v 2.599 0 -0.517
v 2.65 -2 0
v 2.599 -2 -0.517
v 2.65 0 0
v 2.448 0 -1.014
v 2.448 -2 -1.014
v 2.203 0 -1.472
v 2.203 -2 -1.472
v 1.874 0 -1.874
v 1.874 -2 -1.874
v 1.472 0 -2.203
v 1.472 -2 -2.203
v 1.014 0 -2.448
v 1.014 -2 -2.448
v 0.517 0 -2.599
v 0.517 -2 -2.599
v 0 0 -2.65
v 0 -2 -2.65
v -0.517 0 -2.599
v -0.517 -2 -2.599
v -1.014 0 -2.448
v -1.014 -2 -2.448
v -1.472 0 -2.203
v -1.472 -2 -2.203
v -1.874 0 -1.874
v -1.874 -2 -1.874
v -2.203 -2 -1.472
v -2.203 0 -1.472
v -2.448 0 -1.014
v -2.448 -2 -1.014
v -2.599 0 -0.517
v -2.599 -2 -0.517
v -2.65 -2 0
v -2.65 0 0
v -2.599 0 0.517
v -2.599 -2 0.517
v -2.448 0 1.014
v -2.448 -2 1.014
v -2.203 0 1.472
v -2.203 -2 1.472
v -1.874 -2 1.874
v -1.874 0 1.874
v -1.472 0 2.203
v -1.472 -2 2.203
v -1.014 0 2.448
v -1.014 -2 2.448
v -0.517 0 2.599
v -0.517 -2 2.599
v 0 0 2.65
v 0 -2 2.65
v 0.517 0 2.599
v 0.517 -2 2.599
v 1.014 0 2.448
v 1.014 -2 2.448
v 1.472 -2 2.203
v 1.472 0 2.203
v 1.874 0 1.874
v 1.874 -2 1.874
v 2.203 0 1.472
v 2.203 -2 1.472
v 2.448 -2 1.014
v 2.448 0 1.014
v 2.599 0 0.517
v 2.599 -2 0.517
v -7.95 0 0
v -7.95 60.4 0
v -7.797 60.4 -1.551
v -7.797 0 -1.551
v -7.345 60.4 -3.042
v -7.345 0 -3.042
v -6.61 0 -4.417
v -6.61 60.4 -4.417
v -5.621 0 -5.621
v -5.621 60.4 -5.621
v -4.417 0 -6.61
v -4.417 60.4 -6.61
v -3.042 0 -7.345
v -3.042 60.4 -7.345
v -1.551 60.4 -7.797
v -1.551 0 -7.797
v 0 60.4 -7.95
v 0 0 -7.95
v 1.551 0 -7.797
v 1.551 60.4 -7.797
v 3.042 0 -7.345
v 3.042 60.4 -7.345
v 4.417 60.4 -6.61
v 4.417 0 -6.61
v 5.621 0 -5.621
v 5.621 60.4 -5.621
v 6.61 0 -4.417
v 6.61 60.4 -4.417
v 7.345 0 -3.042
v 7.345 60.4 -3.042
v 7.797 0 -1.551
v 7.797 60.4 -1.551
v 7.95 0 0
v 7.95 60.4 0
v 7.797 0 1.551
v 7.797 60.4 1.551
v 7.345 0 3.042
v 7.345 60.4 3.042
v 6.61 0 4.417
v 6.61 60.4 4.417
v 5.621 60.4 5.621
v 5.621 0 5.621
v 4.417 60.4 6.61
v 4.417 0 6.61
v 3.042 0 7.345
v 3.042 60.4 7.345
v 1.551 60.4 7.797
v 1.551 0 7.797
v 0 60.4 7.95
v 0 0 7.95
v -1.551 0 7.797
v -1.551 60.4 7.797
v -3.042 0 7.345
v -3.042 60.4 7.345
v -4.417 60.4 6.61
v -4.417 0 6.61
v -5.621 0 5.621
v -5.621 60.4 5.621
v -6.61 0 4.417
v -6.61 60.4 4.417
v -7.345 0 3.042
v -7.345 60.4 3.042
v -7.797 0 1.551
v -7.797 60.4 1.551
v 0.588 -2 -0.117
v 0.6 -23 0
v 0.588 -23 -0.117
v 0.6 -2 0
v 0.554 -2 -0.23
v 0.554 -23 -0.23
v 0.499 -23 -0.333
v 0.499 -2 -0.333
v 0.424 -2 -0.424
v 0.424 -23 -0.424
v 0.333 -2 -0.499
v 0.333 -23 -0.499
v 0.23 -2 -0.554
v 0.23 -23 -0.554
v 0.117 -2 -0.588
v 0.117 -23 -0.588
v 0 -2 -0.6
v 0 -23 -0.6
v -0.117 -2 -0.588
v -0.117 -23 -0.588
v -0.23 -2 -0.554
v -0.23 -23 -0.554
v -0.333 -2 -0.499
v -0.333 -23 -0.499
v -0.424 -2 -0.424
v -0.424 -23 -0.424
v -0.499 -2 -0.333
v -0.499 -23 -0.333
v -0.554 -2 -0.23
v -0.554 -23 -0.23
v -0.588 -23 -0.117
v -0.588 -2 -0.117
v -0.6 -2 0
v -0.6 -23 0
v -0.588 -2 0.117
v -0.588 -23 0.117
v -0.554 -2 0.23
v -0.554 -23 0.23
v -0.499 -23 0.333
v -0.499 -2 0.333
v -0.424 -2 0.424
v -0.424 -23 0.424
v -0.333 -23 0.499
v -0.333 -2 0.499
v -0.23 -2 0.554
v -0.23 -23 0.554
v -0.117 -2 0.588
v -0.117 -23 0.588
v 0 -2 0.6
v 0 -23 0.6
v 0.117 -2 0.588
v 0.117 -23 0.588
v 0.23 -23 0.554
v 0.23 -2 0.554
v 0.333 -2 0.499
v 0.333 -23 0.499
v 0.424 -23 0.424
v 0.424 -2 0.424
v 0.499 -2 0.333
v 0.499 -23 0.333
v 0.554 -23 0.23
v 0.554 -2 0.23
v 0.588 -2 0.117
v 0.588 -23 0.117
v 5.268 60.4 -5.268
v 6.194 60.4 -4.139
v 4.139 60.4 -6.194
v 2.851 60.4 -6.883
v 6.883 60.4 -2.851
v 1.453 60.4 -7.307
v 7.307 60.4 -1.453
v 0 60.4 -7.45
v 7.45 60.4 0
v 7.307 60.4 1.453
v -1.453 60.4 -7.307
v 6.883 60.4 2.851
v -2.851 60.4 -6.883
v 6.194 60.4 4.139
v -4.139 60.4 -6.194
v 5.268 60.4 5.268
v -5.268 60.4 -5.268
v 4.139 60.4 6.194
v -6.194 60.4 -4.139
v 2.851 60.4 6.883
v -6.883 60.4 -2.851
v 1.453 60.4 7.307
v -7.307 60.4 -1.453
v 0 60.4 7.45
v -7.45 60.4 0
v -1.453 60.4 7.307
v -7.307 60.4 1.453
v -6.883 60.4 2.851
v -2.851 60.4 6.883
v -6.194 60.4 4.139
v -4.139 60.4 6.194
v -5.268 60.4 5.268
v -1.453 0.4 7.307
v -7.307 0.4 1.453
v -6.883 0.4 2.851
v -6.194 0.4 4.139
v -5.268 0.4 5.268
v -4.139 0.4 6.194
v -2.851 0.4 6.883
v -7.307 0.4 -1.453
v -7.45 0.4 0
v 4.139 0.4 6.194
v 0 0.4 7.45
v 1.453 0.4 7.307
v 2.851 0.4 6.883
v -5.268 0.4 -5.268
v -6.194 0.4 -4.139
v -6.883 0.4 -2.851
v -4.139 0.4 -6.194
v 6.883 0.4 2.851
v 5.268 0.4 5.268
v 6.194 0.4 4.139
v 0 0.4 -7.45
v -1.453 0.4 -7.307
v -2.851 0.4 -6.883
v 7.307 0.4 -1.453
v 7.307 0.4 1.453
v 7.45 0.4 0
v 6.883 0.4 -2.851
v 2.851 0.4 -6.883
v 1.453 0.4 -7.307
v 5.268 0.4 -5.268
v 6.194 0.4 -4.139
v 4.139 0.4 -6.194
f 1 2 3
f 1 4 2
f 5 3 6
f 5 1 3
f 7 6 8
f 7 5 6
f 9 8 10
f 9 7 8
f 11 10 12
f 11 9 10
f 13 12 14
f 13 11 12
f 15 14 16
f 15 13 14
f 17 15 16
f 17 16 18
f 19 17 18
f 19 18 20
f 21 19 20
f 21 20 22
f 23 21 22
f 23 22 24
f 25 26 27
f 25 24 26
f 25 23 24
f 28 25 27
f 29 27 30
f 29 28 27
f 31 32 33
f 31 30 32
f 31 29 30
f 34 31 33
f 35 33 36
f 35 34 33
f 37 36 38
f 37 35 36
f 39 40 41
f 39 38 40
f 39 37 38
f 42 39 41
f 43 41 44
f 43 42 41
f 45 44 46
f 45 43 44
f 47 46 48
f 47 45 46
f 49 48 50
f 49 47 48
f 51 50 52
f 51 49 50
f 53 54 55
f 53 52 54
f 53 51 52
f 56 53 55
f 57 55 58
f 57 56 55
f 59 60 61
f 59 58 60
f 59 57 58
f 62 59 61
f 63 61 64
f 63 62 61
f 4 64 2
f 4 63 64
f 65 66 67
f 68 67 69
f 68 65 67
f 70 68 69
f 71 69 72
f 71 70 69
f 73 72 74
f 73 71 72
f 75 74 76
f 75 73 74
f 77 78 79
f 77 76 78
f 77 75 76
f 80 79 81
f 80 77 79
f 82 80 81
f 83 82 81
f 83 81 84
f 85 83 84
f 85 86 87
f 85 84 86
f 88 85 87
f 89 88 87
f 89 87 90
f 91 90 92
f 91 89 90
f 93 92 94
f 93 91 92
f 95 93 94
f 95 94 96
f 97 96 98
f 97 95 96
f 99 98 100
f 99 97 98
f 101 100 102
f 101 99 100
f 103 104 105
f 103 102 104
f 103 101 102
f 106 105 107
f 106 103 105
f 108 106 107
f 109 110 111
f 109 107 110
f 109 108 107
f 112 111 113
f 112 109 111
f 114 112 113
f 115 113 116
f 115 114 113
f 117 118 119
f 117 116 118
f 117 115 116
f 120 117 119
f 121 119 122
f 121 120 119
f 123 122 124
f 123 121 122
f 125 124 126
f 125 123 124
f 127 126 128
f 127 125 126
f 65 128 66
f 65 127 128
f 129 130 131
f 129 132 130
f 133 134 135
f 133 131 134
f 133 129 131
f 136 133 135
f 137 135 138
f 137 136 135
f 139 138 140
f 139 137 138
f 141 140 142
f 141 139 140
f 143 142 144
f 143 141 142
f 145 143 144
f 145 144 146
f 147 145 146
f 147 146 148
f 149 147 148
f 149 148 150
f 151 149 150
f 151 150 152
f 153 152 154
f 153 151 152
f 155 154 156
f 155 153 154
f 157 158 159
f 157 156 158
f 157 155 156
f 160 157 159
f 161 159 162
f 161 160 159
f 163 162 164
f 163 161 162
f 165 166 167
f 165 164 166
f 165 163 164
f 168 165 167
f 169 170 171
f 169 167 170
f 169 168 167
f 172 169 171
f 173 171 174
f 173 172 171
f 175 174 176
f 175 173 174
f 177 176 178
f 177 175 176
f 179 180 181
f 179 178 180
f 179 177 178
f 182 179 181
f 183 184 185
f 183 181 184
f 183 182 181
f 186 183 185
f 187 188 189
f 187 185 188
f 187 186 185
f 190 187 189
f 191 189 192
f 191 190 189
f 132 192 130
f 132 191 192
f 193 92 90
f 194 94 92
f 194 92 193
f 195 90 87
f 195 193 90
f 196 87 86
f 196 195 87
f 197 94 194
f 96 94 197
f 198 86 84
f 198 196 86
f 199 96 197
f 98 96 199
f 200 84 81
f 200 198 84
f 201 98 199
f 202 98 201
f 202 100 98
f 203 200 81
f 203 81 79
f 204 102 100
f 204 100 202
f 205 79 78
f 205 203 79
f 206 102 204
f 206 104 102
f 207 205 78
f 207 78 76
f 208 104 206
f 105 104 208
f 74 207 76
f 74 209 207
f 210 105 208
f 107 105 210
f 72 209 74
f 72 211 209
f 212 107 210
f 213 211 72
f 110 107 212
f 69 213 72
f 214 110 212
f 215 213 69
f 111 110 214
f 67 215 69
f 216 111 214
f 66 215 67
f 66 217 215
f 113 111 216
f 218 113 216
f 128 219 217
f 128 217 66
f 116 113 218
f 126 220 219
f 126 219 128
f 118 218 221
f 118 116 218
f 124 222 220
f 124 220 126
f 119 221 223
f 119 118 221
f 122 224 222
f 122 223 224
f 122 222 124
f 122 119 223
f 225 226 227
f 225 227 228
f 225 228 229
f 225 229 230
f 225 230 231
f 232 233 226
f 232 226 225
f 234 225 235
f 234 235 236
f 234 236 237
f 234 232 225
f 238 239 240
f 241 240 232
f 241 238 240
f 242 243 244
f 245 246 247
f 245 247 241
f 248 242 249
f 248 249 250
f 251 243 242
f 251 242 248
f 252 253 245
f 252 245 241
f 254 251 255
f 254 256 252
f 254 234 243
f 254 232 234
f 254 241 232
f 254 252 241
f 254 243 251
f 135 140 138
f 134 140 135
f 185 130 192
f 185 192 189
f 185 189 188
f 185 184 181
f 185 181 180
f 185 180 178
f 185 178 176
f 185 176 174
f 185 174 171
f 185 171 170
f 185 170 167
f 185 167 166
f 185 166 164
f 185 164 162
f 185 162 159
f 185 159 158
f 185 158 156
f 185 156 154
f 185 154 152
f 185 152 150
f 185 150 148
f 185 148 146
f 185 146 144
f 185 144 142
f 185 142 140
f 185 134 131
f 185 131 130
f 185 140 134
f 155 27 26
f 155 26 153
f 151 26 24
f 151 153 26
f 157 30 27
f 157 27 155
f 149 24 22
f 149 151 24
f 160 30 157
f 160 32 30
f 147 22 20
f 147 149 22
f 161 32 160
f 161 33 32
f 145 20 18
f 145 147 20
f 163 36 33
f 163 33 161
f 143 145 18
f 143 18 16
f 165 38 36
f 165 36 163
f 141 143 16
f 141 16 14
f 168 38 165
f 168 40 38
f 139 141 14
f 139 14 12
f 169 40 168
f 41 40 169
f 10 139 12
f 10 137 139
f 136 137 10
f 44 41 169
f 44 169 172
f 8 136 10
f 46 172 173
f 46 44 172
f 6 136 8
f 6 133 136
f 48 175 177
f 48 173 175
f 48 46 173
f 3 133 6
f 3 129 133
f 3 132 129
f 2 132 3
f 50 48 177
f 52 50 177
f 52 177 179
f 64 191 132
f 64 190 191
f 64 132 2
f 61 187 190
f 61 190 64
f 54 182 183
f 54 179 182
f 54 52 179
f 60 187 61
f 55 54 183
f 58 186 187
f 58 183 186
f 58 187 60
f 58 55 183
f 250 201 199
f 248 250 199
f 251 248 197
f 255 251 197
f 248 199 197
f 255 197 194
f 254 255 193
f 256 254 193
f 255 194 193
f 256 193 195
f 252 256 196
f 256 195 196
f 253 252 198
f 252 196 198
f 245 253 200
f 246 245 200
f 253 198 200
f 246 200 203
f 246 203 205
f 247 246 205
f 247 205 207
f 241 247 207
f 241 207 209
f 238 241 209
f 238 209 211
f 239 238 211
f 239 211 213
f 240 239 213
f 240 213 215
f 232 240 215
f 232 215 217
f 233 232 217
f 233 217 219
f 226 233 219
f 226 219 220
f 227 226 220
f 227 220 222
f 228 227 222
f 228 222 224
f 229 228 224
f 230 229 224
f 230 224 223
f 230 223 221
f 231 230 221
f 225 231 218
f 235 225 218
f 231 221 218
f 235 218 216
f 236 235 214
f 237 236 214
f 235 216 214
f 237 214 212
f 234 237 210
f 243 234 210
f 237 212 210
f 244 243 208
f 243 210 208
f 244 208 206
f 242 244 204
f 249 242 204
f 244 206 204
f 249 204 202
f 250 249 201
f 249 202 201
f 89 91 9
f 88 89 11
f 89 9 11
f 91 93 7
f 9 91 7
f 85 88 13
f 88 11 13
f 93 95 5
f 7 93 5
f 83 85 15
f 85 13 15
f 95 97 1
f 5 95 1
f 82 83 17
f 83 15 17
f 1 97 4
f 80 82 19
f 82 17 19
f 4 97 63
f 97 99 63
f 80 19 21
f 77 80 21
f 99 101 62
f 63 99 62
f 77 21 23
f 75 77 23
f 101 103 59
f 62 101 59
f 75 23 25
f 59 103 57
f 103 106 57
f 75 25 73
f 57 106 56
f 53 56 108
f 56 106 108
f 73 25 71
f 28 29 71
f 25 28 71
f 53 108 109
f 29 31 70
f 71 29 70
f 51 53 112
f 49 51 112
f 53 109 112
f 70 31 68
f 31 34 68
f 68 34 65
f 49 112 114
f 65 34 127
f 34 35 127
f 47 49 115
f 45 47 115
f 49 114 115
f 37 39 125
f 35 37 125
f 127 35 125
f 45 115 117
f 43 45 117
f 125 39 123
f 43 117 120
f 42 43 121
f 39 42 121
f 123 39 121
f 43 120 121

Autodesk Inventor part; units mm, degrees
ref_plane "YZ Plane" through (0, 0, 0) normal (1, 0, 0) x (0, 1, 0)
ref_plane "XZ Plane" through (0, 0, 0) normal (0, 1, 0) x (-1, 0, 0)
ref_plane "XY Plane" through (0, 0, 0) normal (0, 0, 1) x (1, 0, 0)
sketch "Sketch1" plane through (0, 0, 0) normal (0, 1, 0) x (-1, 0, 0)
  circle A0 centre (0, 0) radius 7.95
  dimension "d0" = 15.9
extrude "Extrusion1" add sketch "Sketch1" along normal blind 60.4
sketch "Sketch2" plane through (0, 0, 0) normal (0, -1, 0) x (1, 0, 0)
  circle A0 centre (0, 0) radius 2.65
  dimension "d3" = 5.3
extrude "Extrusion2" add sketch "Sketch2" along normal blind 2
sketch "Sketch3" plane through (0, -2, 0) normal (0, -1, 0) x (1, 0, 0)
  circle A0 centre (0, 0) radius 0.6
  dimension "d6" = 1.2
extrude "Extrusion3" add sketch "Sketch3" along normal blind 21
sketch "Sketch4" plane through (0, 60.4, 0) normal (0, 1, 0) x (1, 0, 0)
  circle A0 centre (0, 0) radius 7.45
  dimension "d9" = 14.9
extrude "Extrusion4" cut sketch "Sketch4" against normal blind 60
properties part number "Syringe_moreaccurate_ENES100_OSV-spencermical-4-52pm-3-5-16-saturday"
